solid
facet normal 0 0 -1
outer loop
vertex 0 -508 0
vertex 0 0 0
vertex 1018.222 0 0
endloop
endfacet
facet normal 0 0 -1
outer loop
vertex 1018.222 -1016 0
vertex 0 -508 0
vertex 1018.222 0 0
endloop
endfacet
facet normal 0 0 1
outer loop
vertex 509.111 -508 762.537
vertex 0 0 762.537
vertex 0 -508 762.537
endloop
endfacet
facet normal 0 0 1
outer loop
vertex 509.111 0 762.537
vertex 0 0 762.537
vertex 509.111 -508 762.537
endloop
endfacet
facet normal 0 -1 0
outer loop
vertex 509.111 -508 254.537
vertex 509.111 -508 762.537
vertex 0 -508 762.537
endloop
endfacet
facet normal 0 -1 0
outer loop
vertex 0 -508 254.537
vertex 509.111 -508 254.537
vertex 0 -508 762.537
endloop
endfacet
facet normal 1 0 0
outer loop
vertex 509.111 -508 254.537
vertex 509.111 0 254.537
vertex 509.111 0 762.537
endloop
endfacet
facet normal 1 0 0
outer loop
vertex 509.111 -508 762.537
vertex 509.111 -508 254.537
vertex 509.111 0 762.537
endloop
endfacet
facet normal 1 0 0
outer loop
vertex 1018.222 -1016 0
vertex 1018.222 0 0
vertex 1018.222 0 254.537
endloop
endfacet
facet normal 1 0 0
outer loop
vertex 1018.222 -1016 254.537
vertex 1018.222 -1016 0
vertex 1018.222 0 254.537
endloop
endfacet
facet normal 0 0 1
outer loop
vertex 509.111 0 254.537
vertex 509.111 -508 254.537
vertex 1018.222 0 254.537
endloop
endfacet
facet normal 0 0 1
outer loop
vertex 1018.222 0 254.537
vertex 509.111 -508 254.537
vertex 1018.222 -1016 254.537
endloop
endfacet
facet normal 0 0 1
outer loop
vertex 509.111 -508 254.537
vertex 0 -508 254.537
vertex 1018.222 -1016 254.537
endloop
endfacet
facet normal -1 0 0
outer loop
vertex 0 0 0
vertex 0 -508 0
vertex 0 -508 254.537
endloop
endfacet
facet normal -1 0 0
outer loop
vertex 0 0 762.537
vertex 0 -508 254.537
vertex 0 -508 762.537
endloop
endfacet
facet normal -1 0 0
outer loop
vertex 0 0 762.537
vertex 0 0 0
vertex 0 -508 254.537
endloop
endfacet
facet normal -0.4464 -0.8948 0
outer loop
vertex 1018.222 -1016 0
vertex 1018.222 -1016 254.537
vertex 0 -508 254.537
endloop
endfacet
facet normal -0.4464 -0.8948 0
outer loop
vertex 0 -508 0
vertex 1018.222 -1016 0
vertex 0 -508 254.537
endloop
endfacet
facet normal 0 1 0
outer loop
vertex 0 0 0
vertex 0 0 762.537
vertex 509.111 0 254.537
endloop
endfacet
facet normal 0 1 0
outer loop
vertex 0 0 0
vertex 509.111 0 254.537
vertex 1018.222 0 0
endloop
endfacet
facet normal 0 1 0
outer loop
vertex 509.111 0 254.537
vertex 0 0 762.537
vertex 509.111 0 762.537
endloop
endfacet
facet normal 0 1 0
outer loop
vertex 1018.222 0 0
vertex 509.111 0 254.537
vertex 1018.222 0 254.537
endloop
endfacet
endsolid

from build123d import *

# Parameters (mm, degrees)
F0_W     = 1018.2218551636
F0_H     = 762.5373601913
F1_DEPTH = 1016
F3_DEPTH = 784.86
F5_DEPTH = 508
F6_W     = 509.1109275818
F6_H     = 508
F7_DEPTH = 543.56


with BuildPart() as f1:
    # F0 (on Front) → F1 (new body)
    with BuildSketch(Plane.XZ):
        with Locations((509.1109275818, 381.2686800957)):
            Rectangle(F0_W, F0_H)
    extrude(amount=F1_DEPTH)

    # F2 (on face) → F3 (cut)
    with BuildSketch(Plane.XY.offset(762.5373601913)):
        Polygon((1018.2218551636, -1016), (0, -508), (0, -1016), align=None)
    extrude(amount=-F3_DEPTH, mode=Mode.SUBTRACT)

    # F4 (on face) → F5 (cut)
    with BuildSketch(Plane.XY.offset(762.5373601913)):
        Polygon((1018.2218551636, -508), (0, -508), (1018.2218551636, -1016), align=None)
    extrude(amount=-F5_DEPTH, mode=Mode.SUBTRACT)

    # F6 (on face) → F7 (cut)
    with BuildSketch(Plane.XZ.offset(508)):
        with Locations((763.6663913727, 508.5373601913)):
            Rectangle(F6_W, F6_H)
    extrude(amount=-F7_DEPTH, mode=Mode.SUBTRACT)


solid = f1.part
